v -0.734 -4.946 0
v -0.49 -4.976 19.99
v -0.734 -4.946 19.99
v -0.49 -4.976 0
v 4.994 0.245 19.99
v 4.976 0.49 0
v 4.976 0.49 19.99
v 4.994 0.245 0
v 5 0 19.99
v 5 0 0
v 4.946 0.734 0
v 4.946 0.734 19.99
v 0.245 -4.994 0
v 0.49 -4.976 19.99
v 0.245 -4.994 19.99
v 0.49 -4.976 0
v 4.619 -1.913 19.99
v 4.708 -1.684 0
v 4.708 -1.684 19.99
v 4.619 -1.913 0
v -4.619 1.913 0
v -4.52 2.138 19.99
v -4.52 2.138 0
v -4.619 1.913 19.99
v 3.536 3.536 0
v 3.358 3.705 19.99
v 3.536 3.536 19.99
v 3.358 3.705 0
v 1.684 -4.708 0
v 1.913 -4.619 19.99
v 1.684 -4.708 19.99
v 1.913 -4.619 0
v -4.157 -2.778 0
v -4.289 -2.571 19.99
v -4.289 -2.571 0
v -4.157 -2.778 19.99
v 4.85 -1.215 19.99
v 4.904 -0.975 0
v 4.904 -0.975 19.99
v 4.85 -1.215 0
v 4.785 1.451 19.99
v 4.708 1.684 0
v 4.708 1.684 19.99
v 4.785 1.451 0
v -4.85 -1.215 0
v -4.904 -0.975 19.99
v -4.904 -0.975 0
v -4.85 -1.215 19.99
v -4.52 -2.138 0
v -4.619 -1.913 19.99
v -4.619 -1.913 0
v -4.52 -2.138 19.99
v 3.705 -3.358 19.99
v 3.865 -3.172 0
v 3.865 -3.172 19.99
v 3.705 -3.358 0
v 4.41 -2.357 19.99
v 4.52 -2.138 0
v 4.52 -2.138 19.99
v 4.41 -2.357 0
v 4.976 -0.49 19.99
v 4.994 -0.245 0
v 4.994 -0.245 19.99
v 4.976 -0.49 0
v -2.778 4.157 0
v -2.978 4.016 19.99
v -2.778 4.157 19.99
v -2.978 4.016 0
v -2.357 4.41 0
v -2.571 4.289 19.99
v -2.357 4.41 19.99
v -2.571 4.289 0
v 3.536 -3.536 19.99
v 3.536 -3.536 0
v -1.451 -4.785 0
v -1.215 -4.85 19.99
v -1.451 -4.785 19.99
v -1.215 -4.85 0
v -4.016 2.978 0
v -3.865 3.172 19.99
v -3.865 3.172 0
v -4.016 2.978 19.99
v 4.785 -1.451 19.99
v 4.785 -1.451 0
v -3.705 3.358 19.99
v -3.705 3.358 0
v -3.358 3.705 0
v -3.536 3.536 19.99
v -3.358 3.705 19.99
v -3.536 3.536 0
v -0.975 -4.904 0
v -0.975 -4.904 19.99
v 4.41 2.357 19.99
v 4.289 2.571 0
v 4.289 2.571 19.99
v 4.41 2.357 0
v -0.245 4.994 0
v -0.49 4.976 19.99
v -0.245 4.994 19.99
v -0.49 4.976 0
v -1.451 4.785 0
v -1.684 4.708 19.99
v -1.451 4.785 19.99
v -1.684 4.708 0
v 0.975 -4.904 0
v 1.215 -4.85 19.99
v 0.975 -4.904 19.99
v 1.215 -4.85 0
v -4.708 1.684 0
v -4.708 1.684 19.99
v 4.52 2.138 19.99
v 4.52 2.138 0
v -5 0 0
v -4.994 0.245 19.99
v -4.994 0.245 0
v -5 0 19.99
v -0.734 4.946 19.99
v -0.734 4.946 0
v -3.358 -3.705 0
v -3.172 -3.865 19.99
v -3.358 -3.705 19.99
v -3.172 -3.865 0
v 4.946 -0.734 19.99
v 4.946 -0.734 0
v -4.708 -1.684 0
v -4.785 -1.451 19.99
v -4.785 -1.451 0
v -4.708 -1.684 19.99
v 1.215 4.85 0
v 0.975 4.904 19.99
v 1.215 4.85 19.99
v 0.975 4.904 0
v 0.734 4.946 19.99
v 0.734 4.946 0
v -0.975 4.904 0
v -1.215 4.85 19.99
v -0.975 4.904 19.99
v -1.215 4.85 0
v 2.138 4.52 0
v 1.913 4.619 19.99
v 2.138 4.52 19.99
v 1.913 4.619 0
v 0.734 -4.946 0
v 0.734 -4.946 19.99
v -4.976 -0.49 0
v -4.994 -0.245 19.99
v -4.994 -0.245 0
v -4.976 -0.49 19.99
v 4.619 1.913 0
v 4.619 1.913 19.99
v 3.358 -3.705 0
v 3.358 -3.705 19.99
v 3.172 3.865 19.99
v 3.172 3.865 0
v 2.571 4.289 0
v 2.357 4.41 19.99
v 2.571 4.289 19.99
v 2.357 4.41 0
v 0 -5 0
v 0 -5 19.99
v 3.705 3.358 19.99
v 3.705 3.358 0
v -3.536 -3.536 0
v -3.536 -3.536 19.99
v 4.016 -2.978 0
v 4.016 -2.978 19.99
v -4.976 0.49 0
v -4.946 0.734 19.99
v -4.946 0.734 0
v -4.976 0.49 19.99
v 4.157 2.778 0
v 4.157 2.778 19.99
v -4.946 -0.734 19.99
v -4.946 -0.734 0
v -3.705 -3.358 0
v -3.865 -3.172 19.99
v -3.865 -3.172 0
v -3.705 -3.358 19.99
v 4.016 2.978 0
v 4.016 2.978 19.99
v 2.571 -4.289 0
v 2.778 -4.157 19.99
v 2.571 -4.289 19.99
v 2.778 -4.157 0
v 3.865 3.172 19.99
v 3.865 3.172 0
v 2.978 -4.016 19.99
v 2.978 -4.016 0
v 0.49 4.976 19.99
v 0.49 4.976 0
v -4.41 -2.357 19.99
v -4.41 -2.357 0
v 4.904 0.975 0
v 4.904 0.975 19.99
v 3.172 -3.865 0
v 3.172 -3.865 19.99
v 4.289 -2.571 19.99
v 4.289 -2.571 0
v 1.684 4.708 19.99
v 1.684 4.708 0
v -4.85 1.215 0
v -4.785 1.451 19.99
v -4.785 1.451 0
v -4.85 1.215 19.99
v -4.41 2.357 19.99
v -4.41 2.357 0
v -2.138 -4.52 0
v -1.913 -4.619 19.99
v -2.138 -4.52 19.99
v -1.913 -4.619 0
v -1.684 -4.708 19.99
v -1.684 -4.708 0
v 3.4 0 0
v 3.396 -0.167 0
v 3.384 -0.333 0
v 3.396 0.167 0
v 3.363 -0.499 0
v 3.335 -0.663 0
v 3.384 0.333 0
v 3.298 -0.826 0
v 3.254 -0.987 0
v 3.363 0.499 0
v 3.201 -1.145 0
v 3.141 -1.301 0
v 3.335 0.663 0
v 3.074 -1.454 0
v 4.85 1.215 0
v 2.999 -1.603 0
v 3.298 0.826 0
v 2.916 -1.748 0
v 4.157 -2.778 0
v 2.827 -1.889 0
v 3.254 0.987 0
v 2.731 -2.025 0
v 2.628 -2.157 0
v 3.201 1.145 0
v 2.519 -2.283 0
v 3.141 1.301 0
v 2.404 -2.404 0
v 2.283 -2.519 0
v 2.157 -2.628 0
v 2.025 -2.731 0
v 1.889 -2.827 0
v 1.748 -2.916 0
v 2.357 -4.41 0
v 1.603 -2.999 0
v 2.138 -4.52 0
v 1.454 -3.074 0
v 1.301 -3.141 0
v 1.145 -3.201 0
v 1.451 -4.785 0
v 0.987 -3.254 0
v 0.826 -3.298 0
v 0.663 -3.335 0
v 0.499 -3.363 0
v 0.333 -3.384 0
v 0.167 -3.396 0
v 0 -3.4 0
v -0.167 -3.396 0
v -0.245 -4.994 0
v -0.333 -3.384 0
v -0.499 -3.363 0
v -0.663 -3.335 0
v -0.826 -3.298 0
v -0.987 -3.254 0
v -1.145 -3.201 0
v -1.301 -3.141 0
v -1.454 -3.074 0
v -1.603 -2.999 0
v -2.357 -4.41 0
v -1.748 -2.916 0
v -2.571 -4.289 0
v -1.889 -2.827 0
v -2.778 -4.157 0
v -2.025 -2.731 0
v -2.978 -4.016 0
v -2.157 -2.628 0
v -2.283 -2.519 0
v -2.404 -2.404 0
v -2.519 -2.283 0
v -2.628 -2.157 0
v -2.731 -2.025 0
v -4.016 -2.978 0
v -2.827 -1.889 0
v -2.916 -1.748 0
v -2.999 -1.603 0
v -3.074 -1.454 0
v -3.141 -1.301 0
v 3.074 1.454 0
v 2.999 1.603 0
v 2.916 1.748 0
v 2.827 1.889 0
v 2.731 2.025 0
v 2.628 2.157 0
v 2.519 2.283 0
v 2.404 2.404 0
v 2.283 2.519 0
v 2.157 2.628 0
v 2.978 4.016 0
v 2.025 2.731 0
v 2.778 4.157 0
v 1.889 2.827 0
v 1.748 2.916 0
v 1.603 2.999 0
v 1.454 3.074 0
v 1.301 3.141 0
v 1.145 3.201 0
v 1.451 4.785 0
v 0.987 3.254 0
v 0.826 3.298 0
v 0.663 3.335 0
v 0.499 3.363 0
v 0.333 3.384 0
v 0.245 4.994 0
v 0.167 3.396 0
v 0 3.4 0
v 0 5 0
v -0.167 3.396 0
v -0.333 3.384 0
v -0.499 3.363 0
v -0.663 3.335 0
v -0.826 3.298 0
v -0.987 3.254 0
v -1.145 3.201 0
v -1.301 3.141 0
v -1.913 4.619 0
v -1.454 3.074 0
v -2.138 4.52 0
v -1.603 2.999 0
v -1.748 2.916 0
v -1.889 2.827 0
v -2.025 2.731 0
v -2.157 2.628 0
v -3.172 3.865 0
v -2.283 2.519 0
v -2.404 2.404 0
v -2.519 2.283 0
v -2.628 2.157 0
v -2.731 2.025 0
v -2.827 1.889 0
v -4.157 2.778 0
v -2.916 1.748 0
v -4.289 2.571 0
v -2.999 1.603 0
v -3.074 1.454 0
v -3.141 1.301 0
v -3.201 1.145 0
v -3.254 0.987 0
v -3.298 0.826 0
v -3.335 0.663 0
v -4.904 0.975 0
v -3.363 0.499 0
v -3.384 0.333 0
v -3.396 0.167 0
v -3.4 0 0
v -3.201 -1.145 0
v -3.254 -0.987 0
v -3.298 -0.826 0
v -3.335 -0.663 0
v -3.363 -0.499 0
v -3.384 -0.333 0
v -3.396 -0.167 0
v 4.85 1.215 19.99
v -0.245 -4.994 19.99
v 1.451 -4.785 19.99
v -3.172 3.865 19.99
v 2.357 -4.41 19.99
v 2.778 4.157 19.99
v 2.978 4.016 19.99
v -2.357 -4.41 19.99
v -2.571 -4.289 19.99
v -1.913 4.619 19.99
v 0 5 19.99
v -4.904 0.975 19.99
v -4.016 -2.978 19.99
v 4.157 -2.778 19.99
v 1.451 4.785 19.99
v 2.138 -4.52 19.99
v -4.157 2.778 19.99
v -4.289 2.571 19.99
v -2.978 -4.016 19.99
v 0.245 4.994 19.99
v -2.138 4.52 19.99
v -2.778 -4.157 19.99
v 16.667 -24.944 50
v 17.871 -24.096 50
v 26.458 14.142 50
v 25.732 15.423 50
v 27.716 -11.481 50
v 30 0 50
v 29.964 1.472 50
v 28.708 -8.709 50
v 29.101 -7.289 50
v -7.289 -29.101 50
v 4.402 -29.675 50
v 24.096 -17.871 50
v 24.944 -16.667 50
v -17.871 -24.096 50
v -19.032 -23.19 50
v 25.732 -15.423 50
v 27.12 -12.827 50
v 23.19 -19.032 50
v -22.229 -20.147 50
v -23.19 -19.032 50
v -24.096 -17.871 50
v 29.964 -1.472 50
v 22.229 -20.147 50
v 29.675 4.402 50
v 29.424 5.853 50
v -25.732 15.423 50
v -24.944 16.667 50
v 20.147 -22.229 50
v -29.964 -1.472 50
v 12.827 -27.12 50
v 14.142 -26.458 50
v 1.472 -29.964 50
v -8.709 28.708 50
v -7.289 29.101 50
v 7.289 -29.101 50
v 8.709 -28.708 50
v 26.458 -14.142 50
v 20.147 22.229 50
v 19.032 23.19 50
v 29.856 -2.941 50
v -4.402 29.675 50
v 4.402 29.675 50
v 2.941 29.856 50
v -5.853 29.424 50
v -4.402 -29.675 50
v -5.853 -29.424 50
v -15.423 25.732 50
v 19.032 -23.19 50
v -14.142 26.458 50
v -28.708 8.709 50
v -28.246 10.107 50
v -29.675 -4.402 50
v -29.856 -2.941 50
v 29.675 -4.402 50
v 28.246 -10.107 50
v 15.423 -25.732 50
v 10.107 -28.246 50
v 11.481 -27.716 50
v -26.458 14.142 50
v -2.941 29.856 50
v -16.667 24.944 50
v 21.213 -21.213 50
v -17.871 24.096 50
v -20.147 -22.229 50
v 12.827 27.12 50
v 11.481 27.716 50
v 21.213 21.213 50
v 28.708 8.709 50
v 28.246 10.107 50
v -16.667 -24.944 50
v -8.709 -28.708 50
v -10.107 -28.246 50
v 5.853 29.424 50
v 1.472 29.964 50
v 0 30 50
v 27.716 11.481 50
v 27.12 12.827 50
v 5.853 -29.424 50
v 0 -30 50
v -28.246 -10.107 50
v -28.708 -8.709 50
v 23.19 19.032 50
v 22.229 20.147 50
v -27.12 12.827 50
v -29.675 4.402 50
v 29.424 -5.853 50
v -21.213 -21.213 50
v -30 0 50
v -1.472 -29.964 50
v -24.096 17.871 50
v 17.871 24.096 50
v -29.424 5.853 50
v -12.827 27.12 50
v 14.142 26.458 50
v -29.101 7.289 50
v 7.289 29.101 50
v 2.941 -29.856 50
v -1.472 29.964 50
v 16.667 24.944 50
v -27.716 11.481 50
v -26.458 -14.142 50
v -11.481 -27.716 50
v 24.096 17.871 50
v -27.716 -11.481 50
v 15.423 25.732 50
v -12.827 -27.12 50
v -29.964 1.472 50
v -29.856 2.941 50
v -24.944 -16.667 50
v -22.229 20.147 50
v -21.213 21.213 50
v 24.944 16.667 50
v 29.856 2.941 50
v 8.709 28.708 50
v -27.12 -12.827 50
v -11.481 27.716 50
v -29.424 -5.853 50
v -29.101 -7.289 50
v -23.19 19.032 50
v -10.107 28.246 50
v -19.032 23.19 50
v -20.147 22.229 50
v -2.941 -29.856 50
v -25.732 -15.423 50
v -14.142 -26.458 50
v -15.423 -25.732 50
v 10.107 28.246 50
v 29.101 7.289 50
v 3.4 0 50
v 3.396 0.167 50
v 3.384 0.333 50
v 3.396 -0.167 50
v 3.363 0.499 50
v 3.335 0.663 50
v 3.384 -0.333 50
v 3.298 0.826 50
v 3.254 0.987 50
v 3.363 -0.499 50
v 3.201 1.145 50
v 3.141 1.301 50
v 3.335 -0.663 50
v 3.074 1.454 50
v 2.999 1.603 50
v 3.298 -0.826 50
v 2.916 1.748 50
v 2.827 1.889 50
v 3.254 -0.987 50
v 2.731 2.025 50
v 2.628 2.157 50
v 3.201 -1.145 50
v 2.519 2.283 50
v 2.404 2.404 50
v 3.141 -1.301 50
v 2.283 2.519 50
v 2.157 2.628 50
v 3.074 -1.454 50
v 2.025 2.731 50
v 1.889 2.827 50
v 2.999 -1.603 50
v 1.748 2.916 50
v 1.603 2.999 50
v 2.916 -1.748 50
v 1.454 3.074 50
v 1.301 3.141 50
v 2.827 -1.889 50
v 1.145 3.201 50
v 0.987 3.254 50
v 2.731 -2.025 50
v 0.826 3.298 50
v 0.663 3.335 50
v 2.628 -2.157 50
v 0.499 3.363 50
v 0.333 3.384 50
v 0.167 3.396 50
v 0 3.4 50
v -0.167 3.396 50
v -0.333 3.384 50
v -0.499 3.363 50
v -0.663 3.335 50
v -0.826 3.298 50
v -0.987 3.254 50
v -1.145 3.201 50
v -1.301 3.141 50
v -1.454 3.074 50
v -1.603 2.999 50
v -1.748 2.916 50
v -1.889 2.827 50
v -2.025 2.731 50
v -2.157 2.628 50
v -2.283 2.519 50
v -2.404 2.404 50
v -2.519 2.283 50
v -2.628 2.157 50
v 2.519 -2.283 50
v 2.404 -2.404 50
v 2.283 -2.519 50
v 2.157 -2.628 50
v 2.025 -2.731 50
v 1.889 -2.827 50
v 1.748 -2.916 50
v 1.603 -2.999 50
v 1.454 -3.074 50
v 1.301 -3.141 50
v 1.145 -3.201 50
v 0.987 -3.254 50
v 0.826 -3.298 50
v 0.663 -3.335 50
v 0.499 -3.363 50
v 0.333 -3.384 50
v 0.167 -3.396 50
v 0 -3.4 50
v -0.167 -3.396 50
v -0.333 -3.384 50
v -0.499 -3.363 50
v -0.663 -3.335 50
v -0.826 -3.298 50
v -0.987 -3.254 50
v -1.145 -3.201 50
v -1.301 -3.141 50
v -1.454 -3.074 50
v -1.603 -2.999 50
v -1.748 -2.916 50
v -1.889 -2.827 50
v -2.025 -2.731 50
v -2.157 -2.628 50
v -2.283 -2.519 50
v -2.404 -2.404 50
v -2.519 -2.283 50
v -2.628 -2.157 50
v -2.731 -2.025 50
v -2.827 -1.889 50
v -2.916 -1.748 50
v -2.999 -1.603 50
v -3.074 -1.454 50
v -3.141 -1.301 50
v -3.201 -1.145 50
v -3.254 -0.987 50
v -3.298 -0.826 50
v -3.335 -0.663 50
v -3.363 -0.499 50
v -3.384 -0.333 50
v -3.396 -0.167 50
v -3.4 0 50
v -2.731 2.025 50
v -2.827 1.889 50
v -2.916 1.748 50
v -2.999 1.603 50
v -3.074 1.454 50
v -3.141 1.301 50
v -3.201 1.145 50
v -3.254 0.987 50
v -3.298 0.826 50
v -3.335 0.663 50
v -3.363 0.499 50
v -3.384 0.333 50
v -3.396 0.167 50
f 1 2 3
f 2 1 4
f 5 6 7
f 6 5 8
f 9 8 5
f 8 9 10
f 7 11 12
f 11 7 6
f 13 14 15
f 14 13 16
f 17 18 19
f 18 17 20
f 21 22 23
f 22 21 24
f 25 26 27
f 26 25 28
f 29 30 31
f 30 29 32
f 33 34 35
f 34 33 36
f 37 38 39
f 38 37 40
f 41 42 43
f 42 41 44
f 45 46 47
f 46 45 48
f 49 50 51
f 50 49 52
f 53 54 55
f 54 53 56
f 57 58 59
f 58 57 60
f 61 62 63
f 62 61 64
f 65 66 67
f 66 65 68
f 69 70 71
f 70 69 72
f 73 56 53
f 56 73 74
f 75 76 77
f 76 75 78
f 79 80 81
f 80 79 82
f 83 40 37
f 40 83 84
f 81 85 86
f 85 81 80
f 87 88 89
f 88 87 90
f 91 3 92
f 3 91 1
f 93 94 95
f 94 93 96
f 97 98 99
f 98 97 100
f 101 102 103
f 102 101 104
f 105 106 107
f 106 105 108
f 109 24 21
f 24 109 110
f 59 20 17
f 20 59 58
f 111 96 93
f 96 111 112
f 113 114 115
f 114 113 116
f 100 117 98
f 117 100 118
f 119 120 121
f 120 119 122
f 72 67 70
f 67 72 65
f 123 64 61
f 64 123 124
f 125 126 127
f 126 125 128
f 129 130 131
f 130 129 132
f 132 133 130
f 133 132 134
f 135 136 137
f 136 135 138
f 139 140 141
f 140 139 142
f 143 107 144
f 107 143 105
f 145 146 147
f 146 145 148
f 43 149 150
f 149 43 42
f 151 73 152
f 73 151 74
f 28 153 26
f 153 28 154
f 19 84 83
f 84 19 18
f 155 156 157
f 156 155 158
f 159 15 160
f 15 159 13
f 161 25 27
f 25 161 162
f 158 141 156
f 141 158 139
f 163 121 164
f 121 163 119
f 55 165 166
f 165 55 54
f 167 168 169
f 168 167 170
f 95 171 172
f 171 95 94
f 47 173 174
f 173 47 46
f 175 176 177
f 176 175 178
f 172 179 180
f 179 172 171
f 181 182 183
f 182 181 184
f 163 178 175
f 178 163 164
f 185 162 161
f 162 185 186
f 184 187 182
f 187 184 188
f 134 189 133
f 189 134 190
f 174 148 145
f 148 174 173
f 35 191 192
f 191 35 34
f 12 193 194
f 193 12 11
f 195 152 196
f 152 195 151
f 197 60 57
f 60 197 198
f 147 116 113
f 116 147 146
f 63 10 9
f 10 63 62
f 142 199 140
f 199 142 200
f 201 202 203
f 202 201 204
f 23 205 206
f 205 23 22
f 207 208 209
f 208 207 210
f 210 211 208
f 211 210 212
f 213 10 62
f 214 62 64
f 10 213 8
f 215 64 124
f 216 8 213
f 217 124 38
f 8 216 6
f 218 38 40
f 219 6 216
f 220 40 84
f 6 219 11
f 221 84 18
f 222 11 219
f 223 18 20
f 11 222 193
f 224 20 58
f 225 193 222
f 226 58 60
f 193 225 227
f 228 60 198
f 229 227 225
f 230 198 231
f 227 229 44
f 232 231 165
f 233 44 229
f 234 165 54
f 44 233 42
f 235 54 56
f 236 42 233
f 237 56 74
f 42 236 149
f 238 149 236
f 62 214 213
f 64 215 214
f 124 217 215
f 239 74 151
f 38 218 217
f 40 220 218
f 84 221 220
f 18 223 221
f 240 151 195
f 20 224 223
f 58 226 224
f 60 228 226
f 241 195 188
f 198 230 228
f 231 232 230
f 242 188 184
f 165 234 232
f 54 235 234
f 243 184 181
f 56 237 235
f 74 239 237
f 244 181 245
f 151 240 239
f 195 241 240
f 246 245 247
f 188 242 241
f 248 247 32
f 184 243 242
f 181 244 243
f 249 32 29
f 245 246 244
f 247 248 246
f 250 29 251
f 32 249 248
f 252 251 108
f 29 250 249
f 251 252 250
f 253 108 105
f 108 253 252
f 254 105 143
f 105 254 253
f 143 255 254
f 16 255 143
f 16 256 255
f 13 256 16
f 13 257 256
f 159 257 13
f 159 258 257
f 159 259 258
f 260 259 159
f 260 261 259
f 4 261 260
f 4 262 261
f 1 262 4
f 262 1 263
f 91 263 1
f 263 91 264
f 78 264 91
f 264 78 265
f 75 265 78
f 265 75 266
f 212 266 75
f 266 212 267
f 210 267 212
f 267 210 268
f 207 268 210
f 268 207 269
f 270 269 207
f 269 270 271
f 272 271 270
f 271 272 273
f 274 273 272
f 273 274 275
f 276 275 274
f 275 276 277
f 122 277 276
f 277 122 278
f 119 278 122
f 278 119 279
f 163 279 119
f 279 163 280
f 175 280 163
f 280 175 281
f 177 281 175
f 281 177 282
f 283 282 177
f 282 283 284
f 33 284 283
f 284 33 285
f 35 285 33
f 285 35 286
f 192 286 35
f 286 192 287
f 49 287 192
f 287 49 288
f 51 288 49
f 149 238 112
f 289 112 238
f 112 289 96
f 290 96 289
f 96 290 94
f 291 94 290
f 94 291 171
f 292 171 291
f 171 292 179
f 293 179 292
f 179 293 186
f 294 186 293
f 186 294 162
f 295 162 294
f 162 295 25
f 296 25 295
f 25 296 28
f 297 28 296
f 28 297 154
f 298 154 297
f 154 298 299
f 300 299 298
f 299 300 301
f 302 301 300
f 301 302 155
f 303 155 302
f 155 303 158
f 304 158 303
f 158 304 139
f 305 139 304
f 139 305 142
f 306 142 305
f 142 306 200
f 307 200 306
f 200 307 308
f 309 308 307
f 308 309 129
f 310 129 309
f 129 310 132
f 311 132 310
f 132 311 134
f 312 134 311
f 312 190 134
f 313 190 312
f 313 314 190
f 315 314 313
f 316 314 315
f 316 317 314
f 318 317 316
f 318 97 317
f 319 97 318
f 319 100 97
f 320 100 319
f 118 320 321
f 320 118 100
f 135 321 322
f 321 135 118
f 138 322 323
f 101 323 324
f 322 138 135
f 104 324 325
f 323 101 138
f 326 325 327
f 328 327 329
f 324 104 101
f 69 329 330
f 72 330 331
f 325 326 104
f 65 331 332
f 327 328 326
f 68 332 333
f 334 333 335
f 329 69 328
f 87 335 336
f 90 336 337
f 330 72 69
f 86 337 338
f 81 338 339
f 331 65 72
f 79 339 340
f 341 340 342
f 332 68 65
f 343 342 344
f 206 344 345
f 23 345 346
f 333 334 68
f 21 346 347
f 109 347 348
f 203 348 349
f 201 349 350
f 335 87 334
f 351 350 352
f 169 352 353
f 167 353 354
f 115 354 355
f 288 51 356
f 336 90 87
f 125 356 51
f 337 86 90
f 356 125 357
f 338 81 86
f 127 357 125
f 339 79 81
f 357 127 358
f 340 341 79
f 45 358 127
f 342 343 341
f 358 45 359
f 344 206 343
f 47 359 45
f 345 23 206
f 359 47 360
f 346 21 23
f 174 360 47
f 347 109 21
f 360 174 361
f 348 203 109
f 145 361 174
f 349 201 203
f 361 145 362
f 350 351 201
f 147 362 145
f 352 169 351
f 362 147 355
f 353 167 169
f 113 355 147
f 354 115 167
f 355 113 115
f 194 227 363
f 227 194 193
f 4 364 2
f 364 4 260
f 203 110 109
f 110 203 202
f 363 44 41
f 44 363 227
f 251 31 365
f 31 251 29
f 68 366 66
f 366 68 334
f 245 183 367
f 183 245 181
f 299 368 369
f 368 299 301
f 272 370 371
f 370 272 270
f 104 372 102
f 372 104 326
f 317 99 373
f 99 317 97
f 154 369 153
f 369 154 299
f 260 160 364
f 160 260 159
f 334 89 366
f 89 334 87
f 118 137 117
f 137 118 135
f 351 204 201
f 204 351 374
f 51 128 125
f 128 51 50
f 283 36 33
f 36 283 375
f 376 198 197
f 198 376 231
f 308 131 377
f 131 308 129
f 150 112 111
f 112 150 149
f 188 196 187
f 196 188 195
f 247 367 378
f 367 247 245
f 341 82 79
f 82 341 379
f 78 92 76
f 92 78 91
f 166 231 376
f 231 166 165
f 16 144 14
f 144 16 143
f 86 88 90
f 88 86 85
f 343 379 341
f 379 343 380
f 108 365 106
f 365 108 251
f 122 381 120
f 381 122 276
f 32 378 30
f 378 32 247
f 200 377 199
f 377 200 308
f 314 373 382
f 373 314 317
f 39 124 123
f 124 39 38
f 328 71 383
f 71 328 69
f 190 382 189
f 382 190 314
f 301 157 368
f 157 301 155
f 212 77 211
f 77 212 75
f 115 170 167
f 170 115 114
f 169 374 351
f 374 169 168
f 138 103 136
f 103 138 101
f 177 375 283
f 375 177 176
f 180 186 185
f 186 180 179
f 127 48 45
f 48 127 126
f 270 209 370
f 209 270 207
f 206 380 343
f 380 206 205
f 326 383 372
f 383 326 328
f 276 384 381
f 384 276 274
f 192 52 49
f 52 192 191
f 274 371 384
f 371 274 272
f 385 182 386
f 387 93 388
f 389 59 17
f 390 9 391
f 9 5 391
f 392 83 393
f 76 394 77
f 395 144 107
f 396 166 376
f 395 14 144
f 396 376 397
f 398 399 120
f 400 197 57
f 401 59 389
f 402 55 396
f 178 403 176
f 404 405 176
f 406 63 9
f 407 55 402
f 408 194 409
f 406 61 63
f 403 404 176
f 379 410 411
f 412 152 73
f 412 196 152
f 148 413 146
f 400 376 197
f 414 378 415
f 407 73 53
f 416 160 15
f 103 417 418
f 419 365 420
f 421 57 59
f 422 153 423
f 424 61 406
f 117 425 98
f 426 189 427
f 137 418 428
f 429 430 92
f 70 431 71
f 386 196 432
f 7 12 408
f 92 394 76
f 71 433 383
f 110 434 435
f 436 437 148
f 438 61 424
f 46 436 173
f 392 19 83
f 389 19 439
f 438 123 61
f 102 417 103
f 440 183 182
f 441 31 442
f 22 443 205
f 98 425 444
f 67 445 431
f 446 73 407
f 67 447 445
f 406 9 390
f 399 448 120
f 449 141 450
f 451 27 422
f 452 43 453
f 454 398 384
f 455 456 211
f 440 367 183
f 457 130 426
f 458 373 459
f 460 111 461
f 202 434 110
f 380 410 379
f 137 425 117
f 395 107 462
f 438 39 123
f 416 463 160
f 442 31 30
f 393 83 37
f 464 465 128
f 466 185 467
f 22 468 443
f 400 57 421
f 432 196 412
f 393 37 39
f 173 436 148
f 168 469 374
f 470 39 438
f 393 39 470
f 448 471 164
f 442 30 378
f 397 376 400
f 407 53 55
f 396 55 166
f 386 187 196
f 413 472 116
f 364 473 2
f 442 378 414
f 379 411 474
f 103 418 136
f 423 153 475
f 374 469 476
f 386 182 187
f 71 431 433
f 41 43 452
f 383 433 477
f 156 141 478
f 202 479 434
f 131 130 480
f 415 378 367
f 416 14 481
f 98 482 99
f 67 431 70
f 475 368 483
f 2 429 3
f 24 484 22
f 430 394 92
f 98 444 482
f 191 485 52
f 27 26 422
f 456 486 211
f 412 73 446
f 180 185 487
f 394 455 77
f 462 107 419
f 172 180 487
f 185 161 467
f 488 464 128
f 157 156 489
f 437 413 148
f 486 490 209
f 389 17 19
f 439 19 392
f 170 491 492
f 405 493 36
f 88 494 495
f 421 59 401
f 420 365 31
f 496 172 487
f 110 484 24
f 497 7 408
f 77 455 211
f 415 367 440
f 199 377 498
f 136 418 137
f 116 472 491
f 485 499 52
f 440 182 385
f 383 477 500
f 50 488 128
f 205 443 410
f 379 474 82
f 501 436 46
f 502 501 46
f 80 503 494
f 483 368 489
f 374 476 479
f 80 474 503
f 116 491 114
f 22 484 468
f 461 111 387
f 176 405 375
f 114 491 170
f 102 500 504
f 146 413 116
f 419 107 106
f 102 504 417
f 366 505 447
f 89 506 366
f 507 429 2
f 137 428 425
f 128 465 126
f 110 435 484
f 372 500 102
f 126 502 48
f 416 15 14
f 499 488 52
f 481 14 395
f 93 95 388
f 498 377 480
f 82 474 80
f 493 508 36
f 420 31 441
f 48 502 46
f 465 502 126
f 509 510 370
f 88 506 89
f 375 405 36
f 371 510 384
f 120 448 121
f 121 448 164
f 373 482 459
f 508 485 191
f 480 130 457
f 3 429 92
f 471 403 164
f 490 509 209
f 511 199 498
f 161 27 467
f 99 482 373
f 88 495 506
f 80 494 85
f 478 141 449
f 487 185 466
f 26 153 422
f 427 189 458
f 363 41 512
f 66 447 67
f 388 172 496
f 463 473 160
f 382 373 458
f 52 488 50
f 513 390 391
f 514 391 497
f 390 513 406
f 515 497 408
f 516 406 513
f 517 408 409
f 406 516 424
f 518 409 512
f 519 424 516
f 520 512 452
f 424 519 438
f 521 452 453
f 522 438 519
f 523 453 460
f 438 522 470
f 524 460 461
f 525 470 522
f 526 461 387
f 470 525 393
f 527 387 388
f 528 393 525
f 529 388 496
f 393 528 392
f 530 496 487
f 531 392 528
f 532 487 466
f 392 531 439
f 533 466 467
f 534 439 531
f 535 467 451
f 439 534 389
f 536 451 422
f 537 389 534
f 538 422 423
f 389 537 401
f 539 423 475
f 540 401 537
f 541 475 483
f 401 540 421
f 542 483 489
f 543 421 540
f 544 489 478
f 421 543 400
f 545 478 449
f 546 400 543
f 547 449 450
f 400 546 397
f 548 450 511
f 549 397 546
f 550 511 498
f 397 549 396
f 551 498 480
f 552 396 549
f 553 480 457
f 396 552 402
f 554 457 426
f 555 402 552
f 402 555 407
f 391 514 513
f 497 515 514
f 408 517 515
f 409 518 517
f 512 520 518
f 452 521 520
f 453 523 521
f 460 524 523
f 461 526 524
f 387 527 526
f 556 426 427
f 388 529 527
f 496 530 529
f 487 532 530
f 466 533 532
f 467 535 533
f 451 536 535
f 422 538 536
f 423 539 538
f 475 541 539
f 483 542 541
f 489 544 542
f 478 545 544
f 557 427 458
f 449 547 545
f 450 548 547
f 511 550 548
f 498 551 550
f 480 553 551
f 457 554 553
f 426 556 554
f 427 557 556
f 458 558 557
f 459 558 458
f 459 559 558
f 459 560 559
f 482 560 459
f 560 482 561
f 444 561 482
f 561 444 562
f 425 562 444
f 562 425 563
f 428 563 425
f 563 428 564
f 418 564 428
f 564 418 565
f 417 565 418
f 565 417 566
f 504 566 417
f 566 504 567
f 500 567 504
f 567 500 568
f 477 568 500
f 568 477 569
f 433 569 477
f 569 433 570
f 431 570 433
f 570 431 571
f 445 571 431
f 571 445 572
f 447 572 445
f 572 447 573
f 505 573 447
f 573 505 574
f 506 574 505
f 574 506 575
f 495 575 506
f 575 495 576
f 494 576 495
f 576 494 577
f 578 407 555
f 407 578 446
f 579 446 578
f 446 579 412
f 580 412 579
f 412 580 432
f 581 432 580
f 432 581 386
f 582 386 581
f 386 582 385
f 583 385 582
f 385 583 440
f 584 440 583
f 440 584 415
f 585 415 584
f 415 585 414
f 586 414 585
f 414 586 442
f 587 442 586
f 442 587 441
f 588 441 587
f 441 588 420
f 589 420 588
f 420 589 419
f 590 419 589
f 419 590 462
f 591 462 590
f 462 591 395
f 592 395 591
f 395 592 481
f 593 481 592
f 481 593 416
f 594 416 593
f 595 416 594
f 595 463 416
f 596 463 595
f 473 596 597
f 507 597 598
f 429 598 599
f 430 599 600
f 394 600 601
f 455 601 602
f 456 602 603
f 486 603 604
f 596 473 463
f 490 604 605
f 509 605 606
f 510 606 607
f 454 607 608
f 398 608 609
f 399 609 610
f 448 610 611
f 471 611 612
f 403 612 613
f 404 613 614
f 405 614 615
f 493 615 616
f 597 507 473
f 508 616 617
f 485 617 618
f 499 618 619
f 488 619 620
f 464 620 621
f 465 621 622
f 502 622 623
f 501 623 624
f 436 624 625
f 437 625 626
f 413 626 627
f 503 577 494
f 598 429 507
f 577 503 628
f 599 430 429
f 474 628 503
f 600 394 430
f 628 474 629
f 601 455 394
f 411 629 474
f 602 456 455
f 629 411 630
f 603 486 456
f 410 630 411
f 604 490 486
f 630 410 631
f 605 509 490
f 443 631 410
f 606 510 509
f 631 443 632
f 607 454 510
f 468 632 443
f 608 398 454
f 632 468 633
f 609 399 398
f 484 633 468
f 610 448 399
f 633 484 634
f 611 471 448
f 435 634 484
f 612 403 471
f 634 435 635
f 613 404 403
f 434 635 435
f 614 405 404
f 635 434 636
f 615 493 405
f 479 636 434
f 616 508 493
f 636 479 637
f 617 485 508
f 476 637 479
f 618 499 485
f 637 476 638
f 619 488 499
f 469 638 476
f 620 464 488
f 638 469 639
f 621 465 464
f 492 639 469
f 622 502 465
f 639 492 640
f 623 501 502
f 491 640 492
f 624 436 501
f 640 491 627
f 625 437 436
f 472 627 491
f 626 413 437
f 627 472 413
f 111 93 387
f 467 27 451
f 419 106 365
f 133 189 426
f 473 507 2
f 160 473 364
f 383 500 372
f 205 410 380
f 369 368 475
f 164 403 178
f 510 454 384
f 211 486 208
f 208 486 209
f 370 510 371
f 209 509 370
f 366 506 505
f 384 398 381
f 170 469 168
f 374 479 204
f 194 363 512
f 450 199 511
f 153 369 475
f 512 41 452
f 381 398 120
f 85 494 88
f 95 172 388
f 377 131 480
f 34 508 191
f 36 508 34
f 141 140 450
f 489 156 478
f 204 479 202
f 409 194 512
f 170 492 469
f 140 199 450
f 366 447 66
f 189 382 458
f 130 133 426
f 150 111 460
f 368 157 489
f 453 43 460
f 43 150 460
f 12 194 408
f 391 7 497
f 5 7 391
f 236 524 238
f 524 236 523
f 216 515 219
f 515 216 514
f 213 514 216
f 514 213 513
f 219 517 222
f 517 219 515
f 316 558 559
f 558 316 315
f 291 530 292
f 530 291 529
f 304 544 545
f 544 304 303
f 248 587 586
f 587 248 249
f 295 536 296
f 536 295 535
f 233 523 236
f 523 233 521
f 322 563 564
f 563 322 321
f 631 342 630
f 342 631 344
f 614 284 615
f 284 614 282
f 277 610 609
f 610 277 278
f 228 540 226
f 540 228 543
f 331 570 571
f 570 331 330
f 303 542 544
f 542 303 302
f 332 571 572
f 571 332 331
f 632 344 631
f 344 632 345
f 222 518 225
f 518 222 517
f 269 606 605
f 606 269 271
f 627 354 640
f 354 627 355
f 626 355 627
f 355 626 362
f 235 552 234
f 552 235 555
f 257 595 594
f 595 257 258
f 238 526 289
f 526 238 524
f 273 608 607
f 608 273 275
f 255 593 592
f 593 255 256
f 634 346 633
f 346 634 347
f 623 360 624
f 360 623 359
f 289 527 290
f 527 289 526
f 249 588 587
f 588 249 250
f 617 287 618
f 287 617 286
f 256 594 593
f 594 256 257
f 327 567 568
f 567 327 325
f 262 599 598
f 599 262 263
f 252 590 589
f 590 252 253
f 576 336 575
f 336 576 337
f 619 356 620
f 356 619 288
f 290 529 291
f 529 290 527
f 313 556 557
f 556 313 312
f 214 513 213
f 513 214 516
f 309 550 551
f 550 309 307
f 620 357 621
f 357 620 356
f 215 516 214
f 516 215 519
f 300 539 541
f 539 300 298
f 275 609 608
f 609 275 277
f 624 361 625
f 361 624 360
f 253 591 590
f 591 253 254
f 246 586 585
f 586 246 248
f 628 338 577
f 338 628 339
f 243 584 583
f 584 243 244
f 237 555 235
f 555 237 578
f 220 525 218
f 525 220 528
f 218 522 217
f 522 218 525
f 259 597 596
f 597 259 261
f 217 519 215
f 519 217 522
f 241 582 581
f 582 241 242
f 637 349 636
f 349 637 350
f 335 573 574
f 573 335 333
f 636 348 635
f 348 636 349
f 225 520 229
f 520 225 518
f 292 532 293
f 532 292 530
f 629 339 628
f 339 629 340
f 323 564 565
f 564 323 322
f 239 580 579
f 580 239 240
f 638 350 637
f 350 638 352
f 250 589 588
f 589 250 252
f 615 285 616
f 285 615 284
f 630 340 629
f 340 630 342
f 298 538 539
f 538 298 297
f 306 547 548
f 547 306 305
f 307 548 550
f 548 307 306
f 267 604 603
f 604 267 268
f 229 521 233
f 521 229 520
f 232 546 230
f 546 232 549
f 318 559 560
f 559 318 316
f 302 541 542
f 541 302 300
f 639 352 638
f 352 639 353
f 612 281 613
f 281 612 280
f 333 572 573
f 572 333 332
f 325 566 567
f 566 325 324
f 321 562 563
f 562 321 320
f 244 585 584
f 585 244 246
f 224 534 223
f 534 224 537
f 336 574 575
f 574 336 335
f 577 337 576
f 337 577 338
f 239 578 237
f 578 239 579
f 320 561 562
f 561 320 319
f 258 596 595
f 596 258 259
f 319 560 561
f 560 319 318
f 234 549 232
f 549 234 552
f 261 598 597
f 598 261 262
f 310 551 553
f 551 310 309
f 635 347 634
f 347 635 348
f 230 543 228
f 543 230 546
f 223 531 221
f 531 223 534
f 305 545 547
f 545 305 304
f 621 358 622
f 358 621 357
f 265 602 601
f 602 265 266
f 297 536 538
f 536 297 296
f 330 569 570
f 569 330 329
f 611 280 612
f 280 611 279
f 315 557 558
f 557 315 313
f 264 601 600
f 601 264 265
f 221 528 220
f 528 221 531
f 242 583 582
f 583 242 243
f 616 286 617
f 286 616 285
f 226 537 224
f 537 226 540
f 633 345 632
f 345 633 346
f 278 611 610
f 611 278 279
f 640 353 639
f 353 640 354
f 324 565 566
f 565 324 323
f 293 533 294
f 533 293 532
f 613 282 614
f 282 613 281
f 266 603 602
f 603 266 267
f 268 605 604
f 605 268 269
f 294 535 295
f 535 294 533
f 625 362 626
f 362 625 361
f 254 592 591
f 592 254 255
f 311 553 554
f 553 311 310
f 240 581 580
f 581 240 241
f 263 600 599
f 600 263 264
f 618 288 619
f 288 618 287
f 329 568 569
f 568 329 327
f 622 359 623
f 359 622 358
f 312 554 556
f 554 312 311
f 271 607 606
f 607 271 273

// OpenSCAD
// Lab funnel - printed upright, wide opening at the top
// Units: mm

// ---- Parameters ----
spout_od        = 10;    // outer diameter of straight spout
spout_length    = 20;    // spout runs from z = 0 to z = 20
cone_bottom_od  = 10;    // cone starts at the spout's outer diameter
cone_top_od     = 60;    // cone rim diameter at z = 50
cone_top_z      = 50;    // height of the funnel rim
wall_thickness  = 1.6;   // wall thickness everywhere (bore = 6.8 mm)
overlap         = 0.01;  // small overlap so the cone fuses with the spout

$fn = 128;

// ---- Model ----
difference() {
    union() {
        // Straight spout
        cylinder(d = spout_od, h = spout_length);

        // Cone on top, extending from z = 20 to z = 50
        translate([0, 0, spout_length - overlap])
            cylinder(d1 = cone_bottom_od, d2 = cone_top_od, h = cone_top_z - spout_length + overlap);
    }

    // Through-bore: cylinder from z = 0 to z = 50 (open bottom and top)
    translate([0, 0, -overlap])
        cylinder(d = spout_od - 2 * wall_thickness, h = cone_top_z + 2 * overlap);
}
